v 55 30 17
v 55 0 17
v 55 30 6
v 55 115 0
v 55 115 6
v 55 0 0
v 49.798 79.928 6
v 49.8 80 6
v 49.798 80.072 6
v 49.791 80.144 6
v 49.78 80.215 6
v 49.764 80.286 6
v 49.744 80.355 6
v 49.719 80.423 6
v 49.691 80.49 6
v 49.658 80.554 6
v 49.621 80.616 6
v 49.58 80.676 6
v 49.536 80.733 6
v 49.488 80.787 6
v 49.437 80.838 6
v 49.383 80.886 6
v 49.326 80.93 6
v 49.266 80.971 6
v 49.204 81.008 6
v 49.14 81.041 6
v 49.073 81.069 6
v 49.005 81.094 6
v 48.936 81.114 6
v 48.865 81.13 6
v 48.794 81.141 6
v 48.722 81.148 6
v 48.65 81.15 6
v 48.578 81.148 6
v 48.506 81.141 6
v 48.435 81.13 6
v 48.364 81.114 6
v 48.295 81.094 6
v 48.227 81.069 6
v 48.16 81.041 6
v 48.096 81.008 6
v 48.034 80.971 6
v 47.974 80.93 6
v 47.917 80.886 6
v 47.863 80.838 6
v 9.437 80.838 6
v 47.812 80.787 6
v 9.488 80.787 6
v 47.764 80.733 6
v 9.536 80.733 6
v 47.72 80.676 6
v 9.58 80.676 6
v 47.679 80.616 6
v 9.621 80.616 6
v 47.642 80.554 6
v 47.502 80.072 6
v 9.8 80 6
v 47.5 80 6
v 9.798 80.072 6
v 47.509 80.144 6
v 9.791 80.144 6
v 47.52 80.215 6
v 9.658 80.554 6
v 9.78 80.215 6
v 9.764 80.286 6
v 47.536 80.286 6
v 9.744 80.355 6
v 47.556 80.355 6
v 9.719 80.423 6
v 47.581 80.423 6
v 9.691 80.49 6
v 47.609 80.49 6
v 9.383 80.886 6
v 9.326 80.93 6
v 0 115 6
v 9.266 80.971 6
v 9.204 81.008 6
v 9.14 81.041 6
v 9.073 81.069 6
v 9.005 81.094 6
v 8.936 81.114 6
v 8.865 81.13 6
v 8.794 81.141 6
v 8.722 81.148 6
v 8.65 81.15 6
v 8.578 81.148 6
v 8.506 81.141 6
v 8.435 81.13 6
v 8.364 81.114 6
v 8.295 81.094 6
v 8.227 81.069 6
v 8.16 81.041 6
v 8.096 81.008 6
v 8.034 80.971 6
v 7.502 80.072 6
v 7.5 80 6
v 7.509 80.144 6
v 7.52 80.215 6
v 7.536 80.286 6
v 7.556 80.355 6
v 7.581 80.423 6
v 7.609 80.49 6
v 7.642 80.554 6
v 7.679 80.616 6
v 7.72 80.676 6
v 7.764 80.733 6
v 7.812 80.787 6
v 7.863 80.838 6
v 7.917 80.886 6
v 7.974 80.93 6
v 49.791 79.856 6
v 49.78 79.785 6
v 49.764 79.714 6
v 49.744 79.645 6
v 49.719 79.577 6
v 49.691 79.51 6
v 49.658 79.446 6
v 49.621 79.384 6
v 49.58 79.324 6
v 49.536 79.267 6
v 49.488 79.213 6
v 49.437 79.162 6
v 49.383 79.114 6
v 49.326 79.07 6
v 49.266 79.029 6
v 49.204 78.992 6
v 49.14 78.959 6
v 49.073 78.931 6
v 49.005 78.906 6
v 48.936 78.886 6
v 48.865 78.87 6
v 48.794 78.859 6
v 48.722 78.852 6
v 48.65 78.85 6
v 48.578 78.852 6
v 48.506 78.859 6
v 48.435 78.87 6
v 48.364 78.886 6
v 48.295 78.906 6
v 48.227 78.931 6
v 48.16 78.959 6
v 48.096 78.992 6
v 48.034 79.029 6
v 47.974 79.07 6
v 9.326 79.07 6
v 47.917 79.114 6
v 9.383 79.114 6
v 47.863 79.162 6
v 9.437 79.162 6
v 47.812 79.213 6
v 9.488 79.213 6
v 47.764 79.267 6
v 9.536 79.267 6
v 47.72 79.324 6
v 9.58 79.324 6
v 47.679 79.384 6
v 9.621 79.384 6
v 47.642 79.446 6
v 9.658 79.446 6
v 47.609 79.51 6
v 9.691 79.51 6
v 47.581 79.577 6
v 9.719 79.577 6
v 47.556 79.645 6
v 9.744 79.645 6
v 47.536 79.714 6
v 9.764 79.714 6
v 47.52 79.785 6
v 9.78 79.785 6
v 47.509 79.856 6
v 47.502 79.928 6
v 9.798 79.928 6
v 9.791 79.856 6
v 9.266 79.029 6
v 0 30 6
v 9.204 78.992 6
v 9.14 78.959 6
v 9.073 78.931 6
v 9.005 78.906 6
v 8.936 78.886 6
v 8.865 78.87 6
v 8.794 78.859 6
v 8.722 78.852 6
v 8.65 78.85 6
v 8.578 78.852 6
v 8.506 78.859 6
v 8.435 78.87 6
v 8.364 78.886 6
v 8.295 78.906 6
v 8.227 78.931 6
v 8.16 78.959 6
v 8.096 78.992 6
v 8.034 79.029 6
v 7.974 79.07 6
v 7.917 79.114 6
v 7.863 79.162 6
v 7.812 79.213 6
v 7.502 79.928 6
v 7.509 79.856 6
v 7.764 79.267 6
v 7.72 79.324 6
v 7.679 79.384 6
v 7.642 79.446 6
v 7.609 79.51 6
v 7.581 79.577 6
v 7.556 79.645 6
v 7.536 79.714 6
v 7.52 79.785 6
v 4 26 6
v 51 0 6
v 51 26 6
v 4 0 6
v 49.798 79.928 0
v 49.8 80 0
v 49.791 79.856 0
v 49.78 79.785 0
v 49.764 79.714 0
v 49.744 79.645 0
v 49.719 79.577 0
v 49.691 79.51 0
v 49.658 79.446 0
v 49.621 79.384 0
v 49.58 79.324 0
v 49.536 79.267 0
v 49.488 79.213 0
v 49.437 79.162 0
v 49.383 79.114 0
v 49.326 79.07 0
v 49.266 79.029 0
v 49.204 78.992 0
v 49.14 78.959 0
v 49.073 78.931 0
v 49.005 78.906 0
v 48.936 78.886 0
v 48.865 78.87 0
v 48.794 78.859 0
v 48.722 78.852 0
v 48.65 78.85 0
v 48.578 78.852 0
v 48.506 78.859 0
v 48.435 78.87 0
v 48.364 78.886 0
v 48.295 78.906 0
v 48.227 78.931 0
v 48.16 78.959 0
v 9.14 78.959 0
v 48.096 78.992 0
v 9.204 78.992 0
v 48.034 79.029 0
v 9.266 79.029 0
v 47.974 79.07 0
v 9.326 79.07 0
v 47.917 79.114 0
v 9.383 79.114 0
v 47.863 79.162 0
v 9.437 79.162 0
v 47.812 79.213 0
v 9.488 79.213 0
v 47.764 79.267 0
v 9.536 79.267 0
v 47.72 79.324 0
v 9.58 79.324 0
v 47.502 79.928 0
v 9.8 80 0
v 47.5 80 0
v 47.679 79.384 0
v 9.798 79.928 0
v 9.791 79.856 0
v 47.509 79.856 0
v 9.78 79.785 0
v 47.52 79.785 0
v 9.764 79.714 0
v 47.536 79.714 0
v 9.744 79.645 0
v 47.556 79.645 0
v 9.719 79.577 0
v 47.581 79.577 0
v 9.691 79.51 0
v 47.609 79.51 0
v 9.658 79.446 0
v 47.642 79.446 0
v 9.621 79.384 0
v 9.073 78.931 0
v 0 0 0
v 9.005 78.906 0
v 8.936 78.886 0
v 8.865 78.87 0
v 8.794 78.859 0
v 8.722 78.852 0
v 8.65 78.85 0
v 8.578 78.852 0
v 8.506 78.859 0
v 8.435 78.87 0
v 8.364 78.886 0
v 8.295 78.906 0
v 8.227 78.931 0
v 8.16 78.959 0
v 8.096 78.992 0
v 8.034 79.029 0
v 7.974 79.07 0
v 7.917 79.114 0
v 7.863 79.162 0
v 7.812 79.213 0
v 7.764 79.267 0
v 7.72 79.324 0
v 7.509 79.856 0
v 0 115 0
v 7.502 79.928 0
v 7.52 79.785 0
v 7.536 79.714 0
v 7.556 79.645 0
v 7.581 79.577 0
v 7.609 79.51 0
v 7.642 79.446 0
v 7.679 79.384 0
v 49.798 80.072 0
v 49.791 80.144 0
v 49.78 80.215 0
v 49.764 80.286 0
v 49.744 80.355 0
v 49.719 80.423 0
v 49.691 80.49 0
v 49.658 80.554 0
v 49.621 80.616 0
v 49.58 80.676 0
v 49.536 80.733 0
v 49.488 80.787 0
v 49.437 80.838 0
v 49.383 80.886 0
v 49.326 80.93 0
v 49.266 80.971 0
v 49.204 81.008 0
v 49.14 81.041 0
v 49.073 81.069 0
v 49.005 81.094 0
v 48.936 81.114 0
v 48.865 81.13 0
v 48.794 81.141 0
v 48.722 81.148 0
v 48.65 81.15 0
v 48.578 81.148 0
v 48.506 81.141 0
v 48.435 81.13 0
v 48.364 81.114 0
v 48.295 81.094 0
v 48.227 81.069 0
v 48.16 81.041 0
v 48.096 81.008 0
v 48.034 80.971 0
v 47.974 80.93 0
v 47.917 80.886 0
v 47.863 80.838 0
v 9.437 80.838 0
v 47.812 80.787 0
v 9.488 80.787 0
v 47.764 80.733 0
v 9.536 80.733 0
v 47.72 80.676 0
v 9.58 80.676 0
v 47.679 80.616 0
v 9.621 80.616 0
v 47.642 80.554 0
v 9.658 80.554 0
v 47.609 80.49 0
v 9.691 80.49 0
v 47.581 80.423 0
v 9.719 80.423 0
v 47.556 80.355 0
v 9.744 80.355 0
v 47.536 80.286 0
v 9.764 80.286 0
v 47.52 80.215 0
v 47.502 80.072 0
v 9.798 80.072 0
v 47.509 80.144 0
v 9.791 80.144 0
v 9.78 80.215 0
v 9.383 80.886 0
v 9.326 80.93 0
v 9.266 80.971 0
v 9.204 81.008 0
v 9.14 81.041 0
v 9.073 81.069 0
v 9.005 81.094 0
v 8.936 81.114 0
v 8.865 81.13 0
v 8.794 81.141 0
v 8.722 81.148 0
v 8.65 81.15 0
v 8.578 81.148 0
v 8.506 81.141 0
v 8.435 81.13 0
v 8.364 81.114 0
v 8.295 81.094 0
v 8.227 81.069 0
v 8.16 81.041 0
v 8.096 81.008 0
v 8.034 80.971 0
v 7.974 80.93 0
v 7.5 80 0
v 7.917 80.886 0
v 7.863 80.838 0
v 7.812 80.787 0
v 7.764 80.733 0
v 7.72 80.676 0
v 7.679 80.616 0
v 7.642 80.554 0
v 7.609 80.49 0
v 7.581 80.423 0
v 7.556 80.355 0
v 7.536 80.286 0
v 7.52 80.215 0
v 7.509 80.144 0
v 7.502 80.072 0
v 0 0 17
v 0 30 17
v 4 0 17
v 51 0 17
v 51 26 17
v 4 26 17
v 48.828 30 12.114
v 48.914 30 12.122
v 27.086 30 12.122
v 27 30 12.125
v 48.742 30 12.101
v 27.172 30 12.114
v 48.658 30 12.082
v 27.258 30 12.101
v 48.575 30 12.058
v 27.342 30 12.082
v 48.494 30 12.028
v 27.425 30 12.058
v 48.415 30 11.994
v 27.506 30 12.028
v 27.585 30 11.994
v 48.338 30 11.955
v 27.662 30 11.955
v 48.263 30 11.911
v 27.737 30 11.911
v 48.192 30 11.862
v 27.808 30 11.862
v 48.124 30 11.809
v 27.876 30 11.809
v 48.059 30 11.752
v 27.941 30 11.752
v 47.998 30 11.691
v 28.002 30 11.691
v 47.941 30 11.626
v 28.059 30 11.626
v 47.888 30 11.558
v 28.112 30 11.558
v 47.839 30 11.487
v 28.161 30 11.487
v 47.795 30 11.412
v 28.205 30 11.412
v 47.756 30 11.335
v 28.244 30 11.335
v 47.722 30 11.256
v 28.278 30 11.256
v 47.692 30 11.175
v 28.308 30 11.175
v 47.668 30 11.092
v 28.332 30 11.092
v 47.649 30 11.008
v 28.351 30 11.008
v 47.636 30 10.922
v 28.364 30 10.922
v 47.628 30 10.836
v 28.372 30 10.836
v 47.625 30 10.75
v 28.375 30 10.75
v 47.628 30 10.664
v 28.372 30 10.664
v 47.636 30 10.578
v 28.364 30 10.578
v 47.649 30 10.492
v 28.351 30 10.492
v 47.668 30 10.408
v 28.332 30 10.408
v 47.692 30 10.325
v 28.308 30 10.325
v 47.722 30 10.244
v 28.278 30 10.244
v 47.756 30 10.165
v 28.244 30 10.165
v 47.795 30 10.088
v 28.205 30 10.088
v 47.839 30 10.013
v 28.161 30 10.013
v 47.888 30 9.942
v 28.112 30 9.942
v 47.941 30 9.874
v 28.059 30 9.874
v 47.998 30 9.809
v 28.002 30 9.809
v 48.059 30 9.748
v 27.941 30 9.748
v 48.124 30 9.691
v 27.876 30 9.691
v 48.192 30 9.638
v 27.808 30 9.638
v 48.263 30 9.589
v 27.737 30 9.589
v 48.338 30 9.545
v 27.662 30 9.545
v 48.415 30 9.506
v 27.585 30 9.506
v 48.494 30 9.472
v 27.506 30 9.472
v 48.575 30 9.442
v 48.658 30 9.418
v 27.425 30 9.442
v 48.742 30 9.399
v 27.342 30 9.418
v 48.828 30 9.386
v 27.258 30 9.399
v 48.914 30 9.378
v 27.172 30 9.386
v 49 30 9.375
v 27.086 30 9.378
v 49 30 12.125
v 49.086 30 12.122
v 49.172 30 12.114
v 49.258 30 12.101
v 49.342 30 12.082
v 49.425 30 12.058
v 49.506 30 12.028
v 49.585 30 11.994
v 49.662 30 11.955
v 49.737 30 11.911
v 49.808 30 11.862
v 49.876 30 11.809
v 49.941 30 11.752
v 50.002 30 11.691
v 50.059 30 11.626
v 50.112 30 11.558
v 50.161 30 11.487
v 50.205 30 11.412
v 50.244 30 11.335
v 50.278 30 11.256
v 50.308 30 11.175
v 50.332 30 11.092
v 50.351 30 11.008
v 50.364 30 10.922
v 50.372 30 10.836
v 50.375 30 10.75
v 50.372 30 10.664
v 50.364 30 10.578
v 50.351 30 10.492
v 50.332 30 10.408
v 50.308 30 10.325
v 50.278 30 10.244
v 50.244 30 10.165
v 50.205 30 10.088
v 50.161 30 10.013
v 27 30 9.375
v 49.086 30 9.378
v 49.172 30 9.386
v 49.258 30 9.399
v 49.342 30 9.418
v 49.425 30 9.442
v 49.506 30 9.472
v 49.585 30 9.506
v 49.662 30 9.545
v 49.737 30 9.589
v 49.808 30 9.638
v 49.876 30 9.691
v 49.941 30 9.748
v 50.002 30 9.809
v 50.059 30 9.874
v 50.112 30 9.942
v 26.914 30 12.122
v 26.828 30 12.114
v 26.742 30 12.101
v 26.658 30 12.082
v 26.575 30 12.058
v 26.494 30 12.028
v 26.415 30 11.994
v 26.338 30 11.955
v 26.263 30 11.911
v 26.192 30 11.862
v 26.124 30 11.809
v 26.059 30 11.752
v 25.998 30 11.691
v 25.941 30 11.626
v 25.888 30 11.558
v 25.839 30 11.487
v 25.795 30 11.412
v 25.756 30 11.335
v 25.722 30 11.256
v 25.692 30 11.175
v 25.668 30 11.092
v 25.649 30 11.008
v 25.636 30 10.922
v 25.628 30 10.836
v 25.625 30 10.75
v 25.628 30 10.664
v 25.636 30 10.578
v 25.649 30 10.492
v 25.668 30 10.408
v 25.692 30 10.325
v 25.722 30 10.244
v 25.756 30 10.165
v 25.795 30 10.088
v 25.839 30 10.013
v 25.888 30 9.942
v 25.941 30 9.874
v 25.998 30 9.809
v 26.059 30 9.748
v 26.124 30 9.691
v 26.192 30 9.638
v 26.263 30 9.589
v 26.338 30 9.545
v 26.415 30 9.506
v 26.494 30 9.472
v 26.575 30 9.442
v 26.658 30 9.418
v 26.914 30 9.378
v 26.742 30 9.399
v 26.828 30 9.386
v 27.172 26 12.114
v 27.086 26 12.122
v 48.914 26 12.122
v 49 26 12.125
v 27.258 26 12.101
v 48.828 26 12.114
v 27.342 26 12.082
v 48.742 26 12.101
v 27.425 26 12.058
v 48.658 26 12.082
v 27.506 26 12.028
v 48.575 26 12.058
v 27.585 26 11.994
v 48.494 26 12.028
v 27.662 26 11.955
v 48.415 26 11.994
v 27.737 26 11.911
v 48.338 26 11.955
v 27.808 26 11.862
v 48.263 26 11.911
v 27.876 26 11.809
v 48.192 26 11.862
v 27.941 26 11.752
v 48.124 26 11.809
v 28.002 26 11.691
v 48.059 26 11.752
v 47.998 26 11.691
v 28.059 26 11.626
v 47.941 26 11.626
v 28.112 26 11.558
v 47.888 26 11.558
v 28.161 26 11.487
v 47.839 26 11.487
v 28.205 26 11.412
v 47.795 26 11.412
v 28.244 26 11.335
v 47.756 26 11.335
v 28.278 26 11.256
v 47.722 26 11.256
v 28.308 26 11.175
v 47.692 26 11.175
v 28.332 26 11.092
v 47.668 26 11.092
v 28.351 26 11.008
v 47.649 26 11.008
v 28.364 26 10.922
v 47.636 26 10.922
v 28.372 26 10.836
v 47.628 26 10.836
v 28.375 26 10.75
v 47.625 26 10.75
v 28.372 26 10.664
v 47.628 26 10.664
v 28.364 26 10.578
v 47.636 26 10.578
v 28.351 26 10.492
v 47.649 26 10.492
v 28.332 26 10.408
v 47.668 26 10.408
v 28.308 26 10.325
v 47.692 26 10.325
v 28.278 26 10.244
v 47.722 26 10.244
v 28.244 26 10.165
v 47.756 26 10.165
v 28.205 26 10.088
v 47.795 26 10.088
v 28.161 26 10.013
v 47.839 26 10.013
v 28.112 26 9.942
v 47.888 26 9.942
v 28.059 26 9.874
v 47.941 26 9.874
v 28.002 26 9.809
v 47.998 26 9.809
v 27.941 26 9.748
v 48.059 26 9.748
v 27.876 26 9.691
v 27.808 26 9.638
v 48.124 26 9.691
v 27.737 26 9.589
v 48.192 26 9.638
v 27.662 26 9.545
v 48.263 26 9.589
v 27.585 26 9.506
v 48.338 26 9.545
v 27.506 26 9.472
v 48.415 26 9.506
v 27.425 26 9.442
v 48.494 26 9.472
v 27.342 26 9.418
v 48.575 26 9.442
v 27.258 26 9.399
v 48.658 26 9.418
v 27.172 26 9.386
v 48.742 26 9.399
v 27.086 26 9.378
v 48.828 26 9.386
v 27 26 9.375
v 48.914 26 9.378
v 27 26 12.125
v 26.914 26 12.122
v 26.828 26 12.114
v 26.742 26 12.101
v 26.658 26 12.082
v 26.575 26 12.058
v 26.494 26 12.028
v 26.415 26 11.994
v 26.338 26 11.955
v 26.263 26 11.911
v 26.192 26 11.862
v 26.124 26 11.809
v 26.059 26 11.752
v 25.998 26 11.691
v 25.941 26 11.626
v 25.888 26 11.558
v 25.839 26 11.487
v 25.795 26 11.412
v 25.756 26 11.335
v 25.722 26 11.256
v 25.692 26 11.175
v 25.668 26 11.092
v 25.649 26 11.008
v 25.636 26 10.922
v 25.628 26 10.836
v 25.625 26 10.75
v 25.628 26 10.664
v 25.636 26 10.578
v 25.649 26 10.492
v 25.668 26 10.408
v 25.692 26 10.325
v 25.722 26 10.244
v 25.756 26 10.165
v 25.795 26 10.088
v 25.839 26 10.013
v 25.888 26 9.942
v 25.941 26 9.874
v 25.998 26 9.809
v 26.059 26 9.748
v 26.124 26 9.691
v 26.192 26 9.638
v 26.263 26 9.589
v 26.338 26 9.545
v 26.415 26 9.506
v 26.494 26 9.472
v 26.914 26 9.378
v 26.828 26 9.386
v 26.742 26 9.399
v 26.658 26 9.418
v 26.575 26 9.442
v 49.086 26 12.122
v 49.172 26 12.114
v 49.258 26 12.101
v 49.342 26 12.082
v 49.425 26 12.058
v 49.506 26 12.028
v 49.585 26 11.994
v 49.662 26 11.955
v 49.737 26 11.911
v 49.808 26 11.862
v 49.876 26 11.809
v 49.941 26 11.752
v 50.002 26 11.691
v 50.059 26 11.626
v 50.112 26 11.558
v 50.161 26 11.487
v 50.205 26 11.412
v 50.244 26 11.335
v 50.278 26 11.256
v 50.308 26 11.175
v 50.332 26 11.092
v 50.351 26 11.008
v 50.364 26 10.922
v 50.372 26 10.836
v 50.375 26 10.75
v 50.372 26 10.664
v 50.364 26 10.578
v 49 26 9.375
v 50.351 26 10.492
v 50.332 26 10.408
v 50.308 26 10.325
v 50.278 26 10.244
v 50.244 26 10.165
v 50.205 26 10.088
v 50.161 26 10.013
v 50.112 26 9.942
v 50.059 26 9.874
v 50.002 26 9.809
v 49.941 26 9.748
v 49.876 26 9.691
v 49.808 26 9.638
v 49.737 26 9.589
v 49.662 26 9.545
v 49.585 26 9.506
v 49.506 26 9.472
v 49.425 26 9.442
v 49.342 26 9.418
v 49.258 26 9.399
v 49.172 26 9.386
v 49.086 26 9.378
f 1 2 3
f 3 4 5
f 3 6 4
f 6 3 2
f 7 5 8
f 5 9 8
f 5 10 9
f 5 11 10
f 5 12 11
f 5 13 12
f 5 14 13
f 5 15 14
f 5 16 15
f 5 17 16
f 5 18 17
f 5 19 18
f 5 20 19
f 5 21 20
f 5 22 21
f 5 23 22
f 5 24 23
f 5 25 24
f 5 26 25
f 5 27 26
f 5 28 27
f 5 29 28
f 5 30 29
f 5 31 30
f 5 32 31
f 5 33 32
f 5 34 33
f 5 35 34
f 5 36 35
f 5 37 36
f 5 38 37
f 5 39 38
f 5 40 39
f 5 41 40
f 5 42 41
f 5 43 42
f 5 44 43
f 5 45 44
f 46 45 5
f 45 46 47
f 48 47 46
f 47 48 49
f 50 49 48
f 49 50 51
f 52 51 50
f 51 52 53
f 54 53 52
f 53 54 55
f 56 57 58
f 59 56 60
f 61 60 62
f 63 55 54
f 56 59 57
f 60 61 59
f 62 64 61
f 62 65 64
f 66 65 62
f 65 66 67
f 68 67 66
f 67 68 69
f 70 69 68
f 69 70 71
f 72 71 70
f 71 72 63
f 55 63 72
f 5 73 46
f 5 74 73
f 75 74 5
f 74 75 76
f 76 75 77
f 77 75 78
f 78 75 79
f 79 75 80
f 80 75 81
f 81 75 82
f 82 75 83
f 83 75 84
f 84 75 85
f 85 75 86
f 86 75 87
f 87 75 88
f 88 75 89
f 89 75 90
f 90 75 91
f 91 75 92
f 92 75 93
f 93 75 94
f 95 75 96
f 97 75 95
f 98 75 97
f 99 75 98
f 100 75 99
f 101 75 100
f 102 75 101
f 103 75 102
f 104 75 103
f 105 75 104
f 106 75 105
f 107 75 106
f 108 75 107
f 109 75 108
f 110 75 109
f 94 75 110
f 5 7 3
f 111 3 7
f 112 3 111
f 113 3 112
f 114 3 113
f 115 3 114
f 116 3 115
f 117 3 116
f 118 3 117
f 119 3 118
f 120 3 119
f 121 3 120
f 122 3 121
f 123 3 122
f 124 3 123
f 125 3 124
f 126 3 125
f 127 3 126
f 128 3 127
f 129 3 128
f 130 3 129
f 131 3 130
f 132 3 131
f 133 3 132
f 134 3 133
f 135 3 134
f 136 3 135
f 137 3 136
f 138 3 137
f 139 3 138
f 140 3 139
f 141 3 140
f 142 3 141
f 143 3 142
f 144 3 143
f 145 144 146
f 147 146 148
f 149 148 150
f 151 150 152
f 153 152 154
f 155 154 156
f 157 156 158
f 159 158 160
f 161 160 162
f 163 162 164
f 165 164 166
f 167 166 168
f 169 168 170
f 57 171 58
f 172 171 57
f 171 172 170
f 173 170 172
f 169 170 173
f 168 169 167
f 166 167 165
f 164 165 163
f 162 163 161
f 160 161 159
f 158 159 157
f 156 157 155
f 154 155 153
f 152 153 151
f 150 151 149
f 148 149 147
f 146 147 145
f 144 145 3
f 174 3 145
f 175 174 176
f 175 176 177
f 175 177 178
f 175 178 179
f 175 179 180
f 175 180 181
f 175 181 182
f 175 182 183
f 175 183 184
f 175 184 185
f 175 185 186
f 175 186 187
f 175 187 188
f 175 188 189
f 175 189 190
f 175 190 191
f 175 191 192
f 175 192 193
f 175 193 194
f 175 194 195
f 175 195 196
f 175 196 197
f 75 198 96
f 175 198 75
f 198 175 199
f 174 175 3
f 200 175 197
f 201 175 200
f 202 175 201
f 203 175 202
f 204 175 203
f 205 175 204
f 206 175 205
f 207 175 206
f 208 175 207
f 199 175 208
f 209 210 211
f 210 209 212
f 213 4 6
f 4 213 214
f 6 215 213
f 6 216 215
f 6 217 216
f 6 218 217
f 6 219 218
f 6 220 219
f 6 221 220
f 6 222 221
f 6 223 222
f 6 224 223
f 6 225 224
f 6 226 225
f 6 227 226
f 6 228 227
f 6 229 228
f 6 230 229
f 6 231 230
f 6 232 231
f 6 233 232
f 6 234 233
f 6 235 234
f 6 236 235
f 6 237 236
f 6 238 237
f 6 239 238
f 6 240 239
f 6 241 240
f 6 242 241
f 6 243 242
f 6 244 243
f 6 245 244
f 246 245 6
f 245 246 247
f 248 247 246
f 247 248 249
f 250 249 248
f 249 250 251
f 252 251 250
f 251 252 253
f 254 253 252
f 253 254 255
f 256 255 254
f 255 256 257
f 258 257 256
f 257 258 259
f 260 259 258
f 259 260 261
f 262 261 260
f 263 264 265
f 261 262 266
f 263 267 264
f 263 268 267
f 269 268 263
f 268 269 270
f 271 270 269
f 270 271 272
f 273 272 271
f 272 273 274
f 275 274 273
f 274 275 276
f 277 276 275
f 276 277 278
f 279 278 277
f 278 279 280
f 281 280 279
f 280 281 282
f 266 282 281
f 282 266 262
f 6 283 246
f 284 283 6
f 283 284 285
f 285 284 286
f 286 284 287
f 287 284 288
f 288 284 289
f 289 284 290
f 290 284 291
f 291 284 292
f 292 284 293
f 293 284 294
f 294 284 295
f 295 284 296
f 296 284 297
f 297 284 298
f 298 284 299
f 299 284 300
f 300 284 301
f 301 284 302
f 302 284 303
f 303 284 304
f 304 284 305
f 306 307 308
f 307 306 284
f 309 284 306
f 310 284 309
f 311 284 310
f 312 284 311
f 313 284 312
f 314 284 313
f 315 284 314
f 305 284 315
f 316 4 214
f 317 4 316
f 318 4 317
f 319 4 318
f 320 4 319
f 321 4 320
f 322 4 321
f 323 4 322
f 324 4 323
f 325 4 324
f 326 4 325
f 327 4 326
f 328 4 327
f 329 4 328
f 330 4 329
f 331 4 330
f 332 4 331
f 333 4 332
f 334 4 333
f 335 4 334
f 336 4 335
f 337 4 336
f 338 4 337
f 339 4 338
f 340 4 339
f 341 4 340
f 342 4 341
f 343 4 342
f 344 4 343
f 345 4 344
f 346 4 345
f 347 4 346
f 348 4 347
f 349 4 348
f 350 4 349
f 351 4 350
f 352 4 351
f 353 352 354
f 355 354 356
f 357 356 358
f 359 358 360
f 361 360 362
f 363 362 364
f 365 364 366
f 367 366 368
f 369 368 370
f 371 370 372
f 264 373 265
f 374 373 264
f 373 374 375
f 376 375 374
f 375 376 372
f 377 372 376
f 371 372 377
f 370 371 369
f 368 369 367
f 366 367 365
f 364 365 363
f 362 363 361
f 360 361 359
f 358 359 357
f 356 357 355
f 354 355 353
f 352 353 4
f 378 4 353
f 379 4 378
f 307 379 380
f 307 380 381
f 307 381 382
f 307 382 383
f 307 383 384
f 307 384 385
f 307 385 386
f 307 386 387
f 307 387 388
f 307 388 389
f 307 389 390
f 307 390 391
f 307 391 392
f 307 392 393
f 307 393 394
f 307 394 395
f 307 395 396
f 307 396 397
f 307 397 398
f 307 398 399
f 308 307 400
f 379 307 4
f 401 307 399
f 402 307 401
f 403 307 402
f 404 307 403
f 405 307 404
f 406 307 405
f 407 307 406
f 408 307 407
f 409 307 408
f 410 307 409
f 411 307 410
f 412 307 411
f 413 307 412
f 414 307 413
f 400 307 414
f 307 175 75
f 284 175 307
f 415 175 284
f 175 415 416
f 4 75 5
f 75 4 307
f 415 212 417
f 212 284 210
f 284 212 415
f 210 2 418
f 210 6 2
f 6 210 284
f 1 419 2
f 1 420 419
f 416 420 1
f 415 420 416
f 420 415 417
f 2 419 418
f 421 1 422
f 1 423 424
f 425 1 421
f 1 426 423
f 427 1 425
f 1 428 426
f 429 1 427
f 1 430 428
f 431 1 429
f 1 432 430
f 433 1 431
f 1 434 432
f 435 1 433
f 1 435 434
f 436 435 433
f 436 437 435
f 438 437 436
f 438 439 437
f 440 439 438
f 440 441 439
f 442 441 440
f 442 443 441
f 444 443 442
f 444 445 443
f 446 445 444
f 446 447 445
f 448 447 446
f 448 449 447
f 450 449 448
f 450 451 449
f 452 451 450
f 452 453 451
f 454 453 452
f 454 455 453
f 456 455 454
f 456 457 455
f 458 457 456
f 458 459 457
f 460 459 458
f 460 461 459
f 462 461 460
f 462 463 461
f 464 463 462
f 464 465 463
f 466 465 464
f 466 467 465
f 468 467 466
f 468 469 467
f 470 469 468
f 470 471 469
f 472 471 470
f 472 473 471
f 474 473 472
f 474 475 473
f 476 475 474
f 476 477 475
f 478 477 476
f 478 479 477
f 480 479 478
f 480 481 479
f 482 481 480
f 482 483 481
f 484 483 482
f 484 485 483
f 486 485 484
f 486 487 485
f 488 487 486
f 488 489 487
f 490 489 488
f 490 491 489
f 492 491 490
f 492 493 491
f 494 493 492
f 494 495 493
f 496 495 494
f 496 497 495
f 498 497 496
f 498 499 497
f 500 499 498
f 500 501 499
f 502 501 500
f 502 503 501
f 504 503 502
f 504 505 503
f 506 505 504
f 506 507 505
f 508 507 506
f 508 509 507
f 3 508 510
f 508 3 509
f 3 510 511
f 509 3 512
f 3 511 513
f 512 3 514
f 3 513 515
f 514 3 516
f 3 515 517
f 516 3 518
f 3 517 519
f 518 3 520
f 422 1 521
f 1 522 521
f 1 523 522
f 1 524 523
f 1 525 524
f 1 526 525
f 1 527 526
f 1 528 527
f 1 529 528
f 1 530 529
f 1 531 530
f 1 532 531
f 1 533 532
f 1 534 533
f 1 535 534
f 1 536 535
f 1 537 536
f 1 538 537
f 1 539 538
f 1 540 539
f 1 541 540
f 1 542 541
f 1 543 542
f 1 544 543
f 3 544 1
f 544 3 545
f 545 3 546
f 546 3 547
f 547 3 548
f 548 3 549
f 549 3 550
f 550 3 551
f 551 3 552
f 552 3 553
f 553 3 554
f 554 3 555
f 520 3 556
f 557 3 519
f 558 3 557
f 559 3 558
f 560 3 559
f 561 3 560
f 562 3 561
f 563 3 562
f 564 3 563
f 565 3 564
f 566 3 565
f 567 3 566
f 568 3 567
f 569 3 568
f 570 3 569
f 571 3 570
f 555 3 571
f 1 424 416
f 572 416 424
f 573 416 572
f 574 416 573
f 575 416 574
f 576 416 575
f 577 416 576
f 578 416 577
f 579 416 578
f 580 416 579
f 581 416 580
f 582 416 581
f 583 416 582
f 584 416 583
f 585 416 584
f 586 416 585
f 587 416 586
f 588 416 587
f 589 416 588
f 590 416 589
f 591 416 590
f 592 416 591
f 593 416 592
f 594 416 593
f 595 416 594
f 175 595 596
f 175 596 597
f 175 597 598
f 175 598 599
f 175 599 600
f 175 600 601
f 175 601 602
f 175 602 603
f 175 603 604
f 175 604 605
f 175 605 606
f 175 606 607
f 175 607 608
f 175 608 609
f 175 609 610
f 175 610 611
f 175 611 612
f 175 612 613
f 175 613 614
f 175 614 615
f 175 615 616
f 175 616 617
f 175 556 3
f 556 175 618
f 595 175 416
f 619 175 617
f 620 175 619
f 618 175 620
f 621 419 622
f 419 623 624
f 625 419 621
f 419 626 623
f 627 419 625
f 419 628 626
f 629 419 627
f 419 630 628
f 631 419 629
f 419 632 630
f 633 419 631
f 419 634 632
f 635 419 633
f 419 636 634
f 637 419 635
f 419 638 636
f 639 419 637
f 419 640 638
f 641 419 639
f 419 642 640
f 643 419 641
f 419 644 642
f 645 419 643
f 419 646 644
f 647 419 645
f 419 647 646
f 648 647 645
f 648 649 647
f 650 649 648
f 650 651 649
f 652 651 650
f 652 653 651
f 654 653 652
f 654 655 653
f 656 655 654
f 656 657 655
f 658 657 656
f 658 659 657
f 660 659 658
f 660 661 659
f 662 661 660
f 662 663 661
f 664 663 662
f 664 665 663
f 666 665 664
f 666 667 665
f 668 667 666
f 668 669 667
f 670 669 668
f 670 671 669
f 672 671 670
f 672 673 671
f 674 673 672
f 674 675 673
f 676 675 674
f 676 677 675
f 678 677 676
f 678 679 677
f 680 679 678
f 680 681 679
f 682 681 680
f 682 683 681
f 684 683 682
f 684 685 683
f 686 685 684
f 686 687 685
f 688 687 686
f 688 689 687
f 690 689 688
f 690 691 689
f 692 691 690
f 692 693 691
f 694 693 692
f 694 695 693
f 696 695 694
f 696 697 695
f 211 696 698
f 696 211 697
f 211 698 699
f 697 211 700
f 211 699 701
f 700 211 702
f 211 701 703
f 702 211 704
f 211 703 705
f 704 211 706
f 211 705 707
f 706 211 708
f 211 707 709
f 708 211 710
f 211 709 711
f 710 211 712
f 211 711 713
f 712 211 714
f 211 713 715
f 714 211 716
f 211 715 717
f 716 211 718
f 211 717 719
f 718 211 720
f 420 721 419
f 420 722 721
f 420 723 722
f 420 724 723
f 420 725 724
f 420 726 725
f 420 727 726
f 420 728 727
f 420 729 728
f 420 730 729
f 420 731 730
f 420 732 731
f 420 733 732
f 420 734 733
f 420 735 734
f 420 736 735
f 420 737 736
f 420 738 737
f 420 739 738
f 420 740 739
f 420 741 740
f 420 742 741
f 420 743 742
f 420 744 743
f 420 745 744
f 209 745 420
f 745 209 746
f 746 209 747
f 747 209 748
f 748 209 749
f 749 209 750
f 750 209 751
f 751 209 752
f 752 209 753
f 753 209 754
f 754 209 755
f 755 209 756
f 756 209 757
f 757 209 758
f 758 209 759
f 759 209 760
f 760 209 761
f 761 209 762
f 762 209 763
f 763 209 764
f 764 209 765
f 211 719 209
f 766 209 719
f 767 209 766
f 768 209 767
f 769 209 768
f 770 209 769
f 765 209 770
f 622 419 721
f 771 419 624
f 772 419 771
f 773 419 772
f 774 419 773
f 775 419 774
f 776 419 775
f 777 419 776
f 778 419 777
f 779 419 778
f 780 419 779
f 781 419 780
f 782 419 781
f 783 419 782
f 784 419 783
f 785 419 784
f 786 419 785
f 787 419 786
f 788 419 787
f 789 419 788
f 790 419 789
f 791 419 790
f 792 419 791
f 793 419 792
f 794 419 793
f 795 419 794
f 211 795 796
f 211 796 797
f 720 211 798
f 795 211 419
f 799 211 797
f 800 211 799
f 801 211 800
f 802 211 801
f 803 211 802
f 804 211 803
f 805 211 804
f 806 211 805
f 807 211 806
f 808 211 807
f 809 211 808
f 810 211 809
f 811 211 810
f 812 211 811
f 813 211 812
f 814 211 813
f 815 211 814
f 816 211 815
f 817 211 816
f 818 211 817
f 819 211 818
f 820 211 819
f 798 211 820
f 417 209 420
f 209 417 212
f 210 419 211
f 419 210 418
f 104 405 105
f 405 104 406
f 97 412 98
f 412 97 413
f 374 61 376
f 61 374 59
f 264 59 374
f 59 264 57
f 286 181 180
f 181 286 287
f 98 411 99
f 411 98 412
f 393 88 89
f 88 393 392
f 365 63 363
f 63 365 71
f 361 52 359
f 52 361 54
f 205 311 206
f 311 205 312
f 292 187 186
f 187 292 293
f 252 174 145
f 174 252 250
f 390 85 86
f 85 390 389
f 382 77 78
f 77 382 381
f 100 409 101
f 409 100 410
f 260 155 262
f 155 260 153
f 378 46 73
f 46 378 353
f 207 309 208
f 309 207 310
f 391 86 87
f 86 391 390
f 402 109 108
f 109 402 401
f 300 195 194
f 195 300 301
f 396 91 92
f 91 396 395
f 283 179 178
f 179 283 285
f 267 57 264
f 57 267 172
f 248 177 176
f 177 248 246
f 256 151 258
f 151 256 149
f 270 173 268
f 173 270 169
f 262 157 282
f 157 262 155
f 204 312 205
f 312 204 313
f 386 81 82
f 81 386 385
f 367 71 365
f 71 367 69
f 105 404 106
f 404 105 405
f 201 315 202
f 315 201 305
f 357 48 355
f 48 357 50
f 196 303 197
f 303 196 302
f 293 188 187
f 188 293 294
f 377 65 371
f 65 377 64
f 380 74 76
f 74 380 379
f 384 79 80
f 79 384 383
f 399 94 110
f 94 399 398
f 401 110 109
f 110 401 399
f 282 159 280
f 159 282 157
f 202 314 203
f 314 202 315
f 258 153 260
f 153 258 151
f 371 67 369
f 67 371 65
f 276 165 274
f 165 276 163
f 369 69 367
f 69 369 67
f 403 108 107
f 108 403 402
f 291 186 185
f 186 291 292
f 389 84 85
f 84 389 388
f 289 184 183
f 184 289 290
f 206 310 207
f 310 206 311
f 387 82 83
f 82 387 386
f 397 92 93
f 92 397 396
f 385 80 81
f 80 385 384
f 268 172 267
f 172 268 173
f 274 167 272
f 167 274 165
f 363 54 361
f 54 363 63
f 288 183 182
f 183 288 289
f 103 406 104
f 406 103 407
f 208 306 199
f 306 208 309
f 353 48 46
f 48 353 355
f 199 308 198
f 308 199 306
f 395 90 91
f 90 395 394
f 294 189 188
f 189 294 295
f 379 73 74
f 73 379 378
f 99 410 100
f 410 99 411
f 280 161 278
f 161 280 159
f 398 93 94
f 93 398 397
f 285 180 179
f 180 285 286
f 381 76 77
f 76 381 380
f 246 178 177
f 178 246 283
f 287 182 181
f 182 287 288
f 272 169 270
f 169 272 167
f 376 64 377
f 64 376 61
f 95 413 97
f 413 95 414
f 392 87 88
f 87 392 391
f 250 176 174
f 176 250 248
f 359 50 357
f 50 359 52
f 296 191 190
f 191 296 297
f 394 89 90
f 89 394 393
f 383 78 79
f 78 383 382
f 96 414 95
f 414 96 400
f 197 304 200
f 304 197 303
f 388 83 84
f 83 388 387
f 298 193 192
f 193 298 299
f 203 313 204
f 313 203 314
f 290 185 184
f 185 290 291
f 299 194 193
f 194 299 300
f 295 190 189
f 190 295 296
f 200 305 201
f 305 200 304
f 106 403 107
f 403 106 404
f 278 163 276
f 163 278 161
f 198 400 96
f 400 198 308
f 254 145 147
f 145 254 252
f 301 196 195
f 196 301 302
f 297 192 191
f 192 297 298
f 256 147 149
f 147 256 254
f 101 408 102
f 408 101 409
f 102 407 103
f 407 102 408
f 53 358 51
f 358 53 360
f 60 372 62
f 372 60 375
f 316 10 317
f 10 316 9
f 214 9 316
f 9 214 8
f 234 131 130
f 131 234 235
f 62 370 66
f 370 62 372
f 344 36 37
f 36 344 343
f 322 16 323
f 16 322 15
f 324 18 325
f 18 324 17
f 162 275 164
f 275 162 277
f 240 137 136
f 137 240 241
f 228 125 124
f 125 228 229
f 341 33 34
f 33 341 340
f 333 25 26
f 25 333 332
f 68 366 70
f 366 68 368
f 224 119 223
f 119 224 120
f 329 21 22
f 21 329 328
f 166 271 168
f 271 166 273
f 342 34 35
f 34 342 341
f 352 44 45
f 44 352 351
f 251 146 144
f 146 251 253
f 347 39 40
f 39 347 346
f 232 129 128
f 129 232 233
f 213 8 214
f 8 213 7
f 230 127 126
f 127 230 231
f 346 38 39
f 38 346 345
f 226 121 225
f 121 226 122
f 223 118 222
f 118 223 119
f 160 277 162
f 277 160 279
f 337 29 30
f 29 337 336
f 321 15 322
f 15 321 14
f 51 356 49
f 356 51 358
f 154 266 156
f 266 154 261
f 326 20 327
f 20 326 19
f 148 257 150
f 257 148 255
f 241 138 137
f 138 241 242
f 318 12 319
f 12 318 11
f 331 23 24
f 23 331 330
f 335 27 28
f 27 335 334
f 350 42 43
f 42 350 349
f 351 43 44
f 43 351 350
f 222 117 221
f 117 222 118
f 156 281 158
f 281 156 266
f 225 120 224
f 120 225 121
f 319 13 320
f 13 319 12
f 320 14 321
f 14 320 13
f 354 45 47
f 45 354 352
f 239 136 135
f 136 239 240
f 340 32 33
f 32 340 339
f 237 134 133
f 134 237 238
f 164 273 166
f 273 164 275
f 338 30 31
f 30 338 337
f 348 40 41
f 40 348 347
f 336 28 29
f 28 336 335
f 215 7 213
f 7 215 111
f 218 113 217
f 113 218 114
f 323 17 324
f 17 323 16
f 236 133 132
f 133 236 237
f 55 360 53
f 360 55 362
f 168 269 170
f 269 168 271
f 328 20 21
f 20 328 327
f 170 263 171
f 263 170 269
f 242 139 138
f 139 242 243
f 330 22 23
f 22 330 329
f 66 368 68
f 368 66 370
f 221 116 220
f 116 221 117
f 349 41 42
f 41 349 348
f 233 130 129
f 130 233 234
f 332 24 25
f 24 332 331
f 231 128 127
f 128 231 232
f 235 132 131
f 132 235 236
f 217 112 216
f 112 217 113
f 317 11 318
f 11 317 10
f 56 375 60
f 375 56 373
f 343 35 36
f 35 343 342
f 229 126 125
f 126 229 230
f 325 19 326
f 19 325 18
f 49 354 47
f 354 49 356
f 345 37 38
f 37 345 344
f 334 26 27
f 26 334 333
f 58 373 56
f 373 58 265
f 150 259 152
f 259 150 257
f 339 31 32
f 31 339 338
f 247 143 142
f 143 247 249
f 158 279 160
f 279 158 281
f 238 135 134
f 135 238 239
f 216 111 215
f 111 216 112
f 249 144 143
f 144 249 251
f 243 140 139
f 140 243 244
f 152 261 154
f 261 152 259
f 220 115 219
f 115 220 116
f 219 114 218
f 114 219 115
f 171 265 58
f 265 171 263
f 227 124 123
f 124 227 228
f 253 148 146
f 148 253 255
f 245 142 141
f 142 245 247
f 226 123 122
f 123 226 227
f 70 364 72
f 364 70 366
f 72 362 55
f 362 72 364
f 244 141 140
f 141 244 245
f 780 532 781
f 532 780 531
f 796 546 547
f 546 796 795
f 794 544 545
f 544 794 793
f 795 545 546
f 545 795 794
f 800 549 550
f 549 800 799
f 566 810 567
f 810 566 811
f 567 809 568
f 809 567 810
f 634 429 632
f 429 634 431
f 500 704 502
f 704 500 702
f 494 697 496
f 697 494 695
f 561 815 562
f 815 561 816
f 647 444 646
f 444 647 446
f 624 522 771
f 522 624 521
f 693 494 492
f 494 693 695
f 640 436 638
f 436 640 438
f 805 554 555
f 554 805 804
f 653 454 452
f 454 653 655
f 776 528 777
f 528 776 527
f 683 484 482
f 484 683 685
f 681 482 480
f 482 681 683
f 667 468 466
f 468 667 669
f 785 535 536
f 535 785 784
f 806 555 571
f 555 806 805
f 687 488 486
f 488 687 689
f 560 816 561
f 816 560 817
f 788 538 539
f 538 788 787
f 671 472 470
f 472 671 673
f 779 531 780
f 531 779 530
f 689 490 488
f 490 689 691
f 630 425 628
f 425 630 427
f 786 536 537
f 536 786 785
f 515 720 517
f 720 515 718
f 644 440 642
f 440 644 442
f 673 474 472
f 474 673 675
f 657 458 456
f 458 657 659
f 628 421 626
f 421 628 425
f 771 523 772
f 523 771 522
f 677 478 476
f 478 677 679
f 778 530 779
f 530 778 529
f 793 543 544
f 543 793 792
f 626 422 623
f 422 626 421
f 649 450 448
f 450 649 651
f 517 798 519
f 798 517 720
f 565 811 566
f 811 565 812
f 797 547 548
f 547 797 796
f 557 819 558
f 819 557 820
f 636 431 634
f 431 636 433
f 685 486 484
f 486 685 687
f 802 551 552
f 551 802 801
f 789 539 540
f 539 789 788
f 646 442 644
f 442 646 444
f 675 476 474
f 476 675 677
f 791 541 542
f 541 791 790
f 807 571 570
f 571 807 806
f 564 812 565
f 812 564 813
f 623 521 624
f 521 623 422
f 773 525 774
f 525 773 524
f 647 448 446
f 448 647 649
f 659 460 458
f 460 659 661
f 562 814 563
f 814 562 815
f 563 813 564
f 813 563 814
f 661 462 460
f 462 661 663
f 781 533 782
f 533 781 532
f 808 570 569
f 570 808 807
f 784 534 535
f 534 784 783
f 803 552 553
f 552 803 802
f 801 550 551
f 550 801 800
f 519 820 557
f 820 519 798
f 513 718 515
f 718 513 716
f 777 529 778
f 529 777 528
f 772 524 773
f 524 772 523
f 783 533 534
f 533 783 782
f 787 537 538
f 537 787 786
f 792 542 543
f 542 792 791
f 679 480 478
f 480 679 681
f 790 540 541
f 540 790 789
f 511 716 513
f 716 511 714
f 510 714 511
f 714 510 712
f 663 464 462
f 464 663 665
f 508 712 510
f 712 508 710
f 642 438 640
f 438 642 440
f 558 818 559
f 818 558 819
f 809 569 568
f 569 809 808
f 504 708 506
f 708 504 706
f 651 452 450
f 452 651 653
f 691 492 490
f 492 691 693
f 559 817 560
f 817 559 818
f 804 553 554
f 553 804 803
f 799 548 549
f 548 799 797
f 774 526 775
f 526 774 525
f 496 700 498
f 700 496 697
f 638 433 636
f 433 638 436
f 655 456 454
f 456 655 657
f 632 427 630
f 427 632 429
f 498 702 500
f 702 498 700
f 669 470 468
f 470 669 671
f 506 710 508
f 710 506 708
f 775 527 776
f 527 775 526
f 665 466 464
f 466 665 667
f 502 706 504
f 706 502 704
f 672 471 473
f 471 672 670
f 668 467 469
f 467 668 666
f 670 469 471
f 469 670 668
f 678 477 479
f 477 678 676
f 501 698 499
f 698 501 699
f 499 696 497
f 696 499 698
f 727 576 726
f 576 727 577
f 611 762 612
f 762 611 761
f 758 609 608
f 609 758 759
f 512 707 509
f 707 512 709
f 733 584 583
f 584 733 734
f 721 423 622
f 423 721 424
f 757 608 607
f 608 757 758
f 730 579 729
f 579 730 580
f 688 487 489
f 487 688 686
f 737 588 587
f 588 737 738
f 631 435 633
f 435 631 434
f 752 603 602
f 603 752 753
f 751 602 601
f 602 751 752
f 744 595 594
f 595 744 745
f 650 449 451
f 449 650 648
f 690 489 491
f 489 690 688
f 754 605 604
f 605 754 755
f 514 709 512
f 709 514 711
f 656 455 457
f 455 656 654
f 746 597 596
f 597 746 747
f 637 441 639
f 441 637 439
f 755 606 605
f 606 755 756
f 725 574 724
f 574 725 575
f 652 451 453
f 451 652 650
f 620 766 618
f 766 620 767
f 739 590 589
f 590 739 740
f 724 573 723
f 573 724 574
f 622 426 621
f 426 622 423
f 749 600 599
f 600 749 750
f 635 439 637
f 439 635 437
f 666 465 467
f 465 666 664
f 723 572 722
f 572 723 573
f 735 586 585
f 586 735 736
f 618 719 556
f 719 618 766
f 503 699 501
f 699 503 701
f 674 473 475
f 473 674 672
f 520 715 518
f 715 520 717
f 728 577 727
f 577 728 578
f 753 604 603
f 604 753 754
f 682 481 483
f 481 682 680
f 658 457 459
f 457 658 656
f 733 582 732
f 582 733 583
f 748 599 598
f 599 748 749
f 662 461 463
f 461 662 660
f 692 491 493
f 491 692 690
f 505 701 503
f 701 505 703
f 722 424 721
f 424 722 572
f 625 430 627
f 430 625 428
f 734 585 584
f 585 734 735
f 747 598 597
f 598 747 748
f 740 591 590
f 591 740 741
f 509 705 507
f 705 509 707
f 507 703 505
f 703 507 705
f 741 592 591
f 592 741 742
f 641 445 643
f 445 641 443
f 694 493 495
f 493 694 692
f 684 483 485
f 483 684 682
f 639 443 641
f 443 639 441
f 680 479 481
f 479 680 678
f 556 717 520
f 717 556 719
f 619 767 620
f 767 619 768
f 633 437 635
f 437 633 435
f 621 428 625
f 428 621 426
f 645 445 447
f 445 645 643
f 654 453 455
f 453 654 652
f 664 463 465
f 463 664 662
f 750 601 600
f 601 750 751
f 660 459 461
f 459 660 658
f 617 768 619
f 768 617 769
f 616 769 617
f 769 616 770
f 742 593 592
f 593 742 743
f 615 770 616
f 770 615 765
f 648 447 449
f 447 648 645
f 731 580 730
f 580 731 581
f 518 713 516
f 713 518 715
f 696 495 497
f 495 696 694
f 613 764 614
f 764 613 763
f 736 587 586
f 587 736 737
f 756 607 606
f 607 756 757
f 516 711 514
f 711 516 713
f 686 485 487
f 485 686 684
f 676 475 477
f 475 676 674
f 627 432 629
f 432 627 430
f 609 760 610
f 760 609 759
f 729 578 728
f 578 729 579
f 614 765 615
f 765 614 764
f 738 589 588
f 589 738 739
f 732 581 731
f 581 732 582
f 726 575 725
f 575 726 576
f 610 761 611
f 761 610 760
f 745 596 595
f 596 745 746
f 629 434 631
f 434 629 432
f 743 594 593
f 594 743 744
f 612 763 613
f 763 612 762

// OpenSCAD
inchesToMM = 25.4;

boxInnerX = 3*inchesToMM;
boxInnerY = 3.5*inchesToMM;
boxInnerZ = 2*inchesToMM;
ds = 1;


plateX = 55;
plateY = 115;
stopY = 26;
thickness=6;
stopT =4;
stopH=11;
hole1Y=70;
hole2Y=hole1Y+40;
hole1D=2.3;
hole2D=2.75;

module plate ()
{
    
    cube ([plateX, plateY,thickness]);
    translate ([0, stopY, 0])
    {
        cube ([plateX, stopT,stopH+thickness]);
    }
    cube ([stopT, stopY,stopH+thickness]);
    translate([plateX-stopT, 0,0])
    {
        cube ([stopT, stopY,stopH+thickness]);
    }
    
    
}

module platedrills ()
{
    x = (plateX-40)/2;
    translate ([x + hole1D/2, 80, -thickness * 4])
    {
       color("red") cylinder(100,d=hole1D,$fn=100);
    }
    translate ([x+40 + hole1D/2, 80, -thickness * 4])
    {
        color("red") cylinder(100,d=hole1D,$fn=100);
    }
    translate([plateX-6, 50, 4.75+thickness])
    {
        rotate([90,0,0]) 
        {       
            {
            color("green") cylinder(100,d=hole2D,$fn=100);
            }
        }
    }
    translate([plateX-28, 50, 4.75+thickness])
    {
        rotate([90,0,0]) 
        {       
            {
            color("green") cylinder(100,d=hole2D,$fn=100);
            }
        }
    }
}

module ebox ()
{
    difference()
    {
        color ("black", 1.0) cube ([boxInnerX+ds, boxInnerY+ds,boxInnerZ],center=true);
        {
            translate ([0,0,ds])
            cube ([boxInnerX, boxInnerY,boxInnerZ], center=true);
        }
    }
}


difference()
{
    plate();
    platedrills();
}
//plate();
//ebox();
